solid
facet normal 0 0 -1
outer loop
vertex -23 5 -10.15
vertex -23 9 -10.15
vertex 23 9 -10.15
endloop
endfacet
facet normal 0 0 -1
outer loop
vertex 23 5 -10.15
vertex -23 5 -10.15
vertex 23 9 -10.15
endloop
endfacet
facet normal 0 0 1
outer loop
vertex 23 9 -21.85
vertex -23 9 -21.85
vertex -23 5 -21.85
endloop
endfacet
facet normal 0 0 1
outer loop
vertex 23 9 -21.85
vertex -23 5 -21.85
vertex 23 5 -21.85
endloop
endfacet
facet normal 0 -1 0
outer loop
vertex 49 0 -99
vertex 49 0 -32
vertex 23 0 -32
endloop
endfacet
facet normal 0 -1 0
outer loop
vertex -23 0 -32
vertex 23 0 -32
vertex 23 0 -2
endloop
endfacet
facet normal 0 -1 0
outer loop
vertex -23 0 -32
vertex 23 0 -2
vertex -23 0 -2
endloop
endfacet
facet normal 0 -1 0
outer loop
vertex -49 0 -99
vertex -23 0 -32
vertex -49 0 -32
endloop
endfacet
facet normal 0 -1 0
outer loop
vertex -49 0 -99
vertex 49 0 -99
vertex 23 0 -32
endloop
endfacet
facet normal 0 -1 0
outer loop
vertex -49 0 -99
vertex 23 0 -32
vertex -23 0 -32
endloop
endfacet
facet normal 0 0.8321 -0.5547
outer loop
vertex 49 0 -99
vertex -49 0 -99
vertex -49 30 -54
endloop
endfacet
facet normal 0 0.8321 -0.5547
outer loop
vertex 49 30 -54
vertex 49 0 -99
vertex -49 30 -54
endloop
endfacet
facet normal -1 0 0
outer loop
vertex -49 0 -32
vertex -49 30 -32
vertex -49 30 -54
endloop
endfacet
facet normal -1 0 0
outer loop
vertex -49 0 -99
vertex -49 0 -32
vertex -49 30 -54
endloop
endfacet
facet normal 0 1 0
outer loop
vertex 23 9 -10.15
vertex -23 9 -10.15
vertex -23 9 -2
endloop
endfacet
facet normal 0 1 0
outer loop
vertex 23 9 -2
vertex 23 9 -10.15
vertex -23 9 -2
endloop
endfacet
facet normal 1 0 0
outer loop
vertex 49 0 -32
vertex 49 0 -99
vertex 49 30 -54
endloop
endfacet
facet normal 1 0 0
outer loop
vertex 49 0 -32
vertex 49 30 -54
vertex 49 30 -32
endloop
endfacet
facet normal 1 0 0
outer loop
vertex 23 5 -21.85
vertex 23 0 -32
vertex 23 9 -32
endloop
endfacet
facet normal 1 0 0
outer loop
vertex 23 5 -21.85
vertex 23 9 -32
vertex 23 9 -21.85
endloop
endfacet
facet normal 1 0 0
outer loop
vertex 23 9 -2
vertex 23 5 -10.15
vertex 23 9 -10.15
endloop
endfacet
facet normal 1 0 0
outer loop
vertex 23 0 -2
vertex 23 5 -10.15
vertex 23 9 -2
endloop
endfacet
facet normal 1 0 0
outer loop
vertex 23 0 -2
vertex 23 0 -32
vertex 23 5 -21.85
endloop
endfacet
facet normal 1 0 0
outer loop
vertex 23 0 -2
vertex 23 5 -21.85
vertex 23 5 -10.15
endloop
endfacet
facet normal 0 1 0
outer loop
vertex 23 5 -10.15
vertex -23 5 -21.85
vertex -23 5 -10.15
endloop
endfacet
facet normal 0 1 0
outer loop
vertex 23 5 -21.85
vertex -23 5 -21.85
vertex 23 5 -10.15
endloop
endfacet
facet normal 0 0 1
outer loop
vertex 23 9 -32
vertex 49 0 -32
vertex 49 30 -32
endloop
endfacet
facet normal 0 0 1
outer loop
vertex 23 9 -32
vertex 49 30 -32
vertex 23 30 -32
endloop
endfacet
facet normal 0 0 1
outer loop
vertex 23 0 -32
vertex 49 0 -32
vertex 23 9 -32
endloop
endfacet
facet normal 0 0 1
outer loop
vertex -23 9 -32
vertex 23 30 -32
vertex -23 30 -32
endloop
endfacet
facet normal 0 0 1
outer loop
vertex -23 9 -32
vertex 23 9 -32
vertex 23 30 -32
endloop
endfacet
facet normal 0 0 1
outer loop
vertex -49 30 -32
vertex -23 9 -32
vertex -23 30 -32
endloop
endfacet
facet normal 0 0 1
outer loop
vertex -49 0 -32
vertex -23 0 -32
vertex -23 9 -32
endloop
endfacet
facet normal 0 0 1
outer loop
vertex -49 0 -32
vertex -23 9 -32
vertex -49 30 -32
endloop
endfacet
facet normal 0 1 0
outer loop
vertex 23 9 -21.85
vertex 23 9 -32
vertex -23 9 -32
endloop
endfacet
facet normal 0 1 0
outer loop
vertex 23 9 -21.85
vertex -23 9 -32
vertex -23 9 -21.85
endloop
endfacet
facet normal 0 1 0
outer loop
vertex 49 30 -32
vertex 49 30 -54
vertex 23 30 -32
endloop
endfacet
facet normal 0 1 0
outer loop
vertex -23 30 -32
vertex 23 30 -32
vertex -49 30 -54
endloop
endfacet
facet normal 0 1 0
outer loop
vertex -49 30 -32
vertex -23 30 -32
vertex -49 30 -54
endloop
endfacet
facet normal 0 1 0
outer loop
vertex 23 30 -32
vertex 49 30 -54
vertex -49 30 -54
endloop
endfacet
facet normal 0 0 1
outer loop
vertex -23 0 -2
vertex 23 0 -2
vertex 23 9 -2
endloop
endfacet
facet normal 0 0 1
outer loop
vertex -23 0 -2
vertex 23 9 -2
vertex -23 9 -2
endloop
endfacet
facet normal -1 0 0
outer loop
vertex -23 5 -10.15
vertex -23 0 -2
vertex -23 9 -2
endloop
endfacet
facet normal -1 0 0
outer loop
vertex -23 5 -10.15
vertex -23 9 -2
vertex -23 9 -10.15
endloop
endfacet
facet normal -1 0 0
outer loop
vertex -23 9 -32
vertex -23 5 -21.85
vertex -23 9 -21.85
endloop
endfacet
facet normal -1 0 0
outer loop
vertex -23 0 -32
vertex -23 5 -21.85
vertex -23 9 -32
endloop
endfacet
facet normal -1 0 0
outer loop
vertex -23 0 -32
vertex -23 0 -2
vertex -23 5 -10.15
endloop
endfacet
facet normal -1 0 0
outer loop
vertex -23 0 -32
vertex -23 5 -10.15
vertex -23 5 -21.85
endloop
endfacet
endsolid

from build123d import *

# Parameters (mm, degrees)
EXTRUDE_1_DEPTH     = 30
CUT_EXTRUDE_1_DEPTH = 98
SKETCH_3_W          = 46
SKETCH_3_H          = 11.7
CUT_EXTRUDE_2_DEPTH = 25
SKETCH_4_W          = 33.079477917
SKETCH_4_H          = 22.974752345
CUT_EXTRUDE_3_DEPTH = 46


with BuildPart() as part:
    # Эскиз1 → Бобышка-Вытянуть1 (new body)
    with BuildSketch(Plane(origin=(0, 0, 0), x_dir=(1, 0, 0), z_dir=(0, 1, 0))):
        Polygon((-49, 100), (49, 100), (49, 32), (23, 32), (23, 2), (-23, 2), (-23, 32), (-49, 32), align=None)
    extrude(amount=EXTRUDE_1_DEPTH)

    # Эскиз2 → Вырез-Вытянуть1 (cut)
    with BuildSketch(Plane.ZY.offset(49)):
        Polygon((-99, 0), (-54, 30), (-54, 44.902794758), (-113.255457038, 44.902794758), (-113.255457038, 0), align=None)
    extrude(amount=-CUT_EXTRUDE_1_DEPTH, mode=Mode.SUBTRACT)

    # Эскиз3 → Вырез-Вытянуть2 (cut)
    with BuildSketch(Plane(origin=(0, 30, 0), x_dir=(1, 0, 0), z_dir=(0, 1, 0))):
        with Locations((0, 16)):
            Rectangle(SKETCH_3_W, SKETCH_3_H)
    extrude(amount=-CUT_EXTRUDE_2_DEPTH, mode=Mode.SUBTRACT)

    # Эскиз4 → Вырез-Вытянуть3 (cut)
    with BuildSketch(Plane.ZY.offset(23)):
        with Locations((-15.460261042, 20.487376172)):
            Rectangle(SKETCH_4_W, SKETCH_4_H)
    extrude(amount=-CUT_EXTRUDE_3_DEPTH, mode=Mode.SUBTRACT)


solid = part.part
